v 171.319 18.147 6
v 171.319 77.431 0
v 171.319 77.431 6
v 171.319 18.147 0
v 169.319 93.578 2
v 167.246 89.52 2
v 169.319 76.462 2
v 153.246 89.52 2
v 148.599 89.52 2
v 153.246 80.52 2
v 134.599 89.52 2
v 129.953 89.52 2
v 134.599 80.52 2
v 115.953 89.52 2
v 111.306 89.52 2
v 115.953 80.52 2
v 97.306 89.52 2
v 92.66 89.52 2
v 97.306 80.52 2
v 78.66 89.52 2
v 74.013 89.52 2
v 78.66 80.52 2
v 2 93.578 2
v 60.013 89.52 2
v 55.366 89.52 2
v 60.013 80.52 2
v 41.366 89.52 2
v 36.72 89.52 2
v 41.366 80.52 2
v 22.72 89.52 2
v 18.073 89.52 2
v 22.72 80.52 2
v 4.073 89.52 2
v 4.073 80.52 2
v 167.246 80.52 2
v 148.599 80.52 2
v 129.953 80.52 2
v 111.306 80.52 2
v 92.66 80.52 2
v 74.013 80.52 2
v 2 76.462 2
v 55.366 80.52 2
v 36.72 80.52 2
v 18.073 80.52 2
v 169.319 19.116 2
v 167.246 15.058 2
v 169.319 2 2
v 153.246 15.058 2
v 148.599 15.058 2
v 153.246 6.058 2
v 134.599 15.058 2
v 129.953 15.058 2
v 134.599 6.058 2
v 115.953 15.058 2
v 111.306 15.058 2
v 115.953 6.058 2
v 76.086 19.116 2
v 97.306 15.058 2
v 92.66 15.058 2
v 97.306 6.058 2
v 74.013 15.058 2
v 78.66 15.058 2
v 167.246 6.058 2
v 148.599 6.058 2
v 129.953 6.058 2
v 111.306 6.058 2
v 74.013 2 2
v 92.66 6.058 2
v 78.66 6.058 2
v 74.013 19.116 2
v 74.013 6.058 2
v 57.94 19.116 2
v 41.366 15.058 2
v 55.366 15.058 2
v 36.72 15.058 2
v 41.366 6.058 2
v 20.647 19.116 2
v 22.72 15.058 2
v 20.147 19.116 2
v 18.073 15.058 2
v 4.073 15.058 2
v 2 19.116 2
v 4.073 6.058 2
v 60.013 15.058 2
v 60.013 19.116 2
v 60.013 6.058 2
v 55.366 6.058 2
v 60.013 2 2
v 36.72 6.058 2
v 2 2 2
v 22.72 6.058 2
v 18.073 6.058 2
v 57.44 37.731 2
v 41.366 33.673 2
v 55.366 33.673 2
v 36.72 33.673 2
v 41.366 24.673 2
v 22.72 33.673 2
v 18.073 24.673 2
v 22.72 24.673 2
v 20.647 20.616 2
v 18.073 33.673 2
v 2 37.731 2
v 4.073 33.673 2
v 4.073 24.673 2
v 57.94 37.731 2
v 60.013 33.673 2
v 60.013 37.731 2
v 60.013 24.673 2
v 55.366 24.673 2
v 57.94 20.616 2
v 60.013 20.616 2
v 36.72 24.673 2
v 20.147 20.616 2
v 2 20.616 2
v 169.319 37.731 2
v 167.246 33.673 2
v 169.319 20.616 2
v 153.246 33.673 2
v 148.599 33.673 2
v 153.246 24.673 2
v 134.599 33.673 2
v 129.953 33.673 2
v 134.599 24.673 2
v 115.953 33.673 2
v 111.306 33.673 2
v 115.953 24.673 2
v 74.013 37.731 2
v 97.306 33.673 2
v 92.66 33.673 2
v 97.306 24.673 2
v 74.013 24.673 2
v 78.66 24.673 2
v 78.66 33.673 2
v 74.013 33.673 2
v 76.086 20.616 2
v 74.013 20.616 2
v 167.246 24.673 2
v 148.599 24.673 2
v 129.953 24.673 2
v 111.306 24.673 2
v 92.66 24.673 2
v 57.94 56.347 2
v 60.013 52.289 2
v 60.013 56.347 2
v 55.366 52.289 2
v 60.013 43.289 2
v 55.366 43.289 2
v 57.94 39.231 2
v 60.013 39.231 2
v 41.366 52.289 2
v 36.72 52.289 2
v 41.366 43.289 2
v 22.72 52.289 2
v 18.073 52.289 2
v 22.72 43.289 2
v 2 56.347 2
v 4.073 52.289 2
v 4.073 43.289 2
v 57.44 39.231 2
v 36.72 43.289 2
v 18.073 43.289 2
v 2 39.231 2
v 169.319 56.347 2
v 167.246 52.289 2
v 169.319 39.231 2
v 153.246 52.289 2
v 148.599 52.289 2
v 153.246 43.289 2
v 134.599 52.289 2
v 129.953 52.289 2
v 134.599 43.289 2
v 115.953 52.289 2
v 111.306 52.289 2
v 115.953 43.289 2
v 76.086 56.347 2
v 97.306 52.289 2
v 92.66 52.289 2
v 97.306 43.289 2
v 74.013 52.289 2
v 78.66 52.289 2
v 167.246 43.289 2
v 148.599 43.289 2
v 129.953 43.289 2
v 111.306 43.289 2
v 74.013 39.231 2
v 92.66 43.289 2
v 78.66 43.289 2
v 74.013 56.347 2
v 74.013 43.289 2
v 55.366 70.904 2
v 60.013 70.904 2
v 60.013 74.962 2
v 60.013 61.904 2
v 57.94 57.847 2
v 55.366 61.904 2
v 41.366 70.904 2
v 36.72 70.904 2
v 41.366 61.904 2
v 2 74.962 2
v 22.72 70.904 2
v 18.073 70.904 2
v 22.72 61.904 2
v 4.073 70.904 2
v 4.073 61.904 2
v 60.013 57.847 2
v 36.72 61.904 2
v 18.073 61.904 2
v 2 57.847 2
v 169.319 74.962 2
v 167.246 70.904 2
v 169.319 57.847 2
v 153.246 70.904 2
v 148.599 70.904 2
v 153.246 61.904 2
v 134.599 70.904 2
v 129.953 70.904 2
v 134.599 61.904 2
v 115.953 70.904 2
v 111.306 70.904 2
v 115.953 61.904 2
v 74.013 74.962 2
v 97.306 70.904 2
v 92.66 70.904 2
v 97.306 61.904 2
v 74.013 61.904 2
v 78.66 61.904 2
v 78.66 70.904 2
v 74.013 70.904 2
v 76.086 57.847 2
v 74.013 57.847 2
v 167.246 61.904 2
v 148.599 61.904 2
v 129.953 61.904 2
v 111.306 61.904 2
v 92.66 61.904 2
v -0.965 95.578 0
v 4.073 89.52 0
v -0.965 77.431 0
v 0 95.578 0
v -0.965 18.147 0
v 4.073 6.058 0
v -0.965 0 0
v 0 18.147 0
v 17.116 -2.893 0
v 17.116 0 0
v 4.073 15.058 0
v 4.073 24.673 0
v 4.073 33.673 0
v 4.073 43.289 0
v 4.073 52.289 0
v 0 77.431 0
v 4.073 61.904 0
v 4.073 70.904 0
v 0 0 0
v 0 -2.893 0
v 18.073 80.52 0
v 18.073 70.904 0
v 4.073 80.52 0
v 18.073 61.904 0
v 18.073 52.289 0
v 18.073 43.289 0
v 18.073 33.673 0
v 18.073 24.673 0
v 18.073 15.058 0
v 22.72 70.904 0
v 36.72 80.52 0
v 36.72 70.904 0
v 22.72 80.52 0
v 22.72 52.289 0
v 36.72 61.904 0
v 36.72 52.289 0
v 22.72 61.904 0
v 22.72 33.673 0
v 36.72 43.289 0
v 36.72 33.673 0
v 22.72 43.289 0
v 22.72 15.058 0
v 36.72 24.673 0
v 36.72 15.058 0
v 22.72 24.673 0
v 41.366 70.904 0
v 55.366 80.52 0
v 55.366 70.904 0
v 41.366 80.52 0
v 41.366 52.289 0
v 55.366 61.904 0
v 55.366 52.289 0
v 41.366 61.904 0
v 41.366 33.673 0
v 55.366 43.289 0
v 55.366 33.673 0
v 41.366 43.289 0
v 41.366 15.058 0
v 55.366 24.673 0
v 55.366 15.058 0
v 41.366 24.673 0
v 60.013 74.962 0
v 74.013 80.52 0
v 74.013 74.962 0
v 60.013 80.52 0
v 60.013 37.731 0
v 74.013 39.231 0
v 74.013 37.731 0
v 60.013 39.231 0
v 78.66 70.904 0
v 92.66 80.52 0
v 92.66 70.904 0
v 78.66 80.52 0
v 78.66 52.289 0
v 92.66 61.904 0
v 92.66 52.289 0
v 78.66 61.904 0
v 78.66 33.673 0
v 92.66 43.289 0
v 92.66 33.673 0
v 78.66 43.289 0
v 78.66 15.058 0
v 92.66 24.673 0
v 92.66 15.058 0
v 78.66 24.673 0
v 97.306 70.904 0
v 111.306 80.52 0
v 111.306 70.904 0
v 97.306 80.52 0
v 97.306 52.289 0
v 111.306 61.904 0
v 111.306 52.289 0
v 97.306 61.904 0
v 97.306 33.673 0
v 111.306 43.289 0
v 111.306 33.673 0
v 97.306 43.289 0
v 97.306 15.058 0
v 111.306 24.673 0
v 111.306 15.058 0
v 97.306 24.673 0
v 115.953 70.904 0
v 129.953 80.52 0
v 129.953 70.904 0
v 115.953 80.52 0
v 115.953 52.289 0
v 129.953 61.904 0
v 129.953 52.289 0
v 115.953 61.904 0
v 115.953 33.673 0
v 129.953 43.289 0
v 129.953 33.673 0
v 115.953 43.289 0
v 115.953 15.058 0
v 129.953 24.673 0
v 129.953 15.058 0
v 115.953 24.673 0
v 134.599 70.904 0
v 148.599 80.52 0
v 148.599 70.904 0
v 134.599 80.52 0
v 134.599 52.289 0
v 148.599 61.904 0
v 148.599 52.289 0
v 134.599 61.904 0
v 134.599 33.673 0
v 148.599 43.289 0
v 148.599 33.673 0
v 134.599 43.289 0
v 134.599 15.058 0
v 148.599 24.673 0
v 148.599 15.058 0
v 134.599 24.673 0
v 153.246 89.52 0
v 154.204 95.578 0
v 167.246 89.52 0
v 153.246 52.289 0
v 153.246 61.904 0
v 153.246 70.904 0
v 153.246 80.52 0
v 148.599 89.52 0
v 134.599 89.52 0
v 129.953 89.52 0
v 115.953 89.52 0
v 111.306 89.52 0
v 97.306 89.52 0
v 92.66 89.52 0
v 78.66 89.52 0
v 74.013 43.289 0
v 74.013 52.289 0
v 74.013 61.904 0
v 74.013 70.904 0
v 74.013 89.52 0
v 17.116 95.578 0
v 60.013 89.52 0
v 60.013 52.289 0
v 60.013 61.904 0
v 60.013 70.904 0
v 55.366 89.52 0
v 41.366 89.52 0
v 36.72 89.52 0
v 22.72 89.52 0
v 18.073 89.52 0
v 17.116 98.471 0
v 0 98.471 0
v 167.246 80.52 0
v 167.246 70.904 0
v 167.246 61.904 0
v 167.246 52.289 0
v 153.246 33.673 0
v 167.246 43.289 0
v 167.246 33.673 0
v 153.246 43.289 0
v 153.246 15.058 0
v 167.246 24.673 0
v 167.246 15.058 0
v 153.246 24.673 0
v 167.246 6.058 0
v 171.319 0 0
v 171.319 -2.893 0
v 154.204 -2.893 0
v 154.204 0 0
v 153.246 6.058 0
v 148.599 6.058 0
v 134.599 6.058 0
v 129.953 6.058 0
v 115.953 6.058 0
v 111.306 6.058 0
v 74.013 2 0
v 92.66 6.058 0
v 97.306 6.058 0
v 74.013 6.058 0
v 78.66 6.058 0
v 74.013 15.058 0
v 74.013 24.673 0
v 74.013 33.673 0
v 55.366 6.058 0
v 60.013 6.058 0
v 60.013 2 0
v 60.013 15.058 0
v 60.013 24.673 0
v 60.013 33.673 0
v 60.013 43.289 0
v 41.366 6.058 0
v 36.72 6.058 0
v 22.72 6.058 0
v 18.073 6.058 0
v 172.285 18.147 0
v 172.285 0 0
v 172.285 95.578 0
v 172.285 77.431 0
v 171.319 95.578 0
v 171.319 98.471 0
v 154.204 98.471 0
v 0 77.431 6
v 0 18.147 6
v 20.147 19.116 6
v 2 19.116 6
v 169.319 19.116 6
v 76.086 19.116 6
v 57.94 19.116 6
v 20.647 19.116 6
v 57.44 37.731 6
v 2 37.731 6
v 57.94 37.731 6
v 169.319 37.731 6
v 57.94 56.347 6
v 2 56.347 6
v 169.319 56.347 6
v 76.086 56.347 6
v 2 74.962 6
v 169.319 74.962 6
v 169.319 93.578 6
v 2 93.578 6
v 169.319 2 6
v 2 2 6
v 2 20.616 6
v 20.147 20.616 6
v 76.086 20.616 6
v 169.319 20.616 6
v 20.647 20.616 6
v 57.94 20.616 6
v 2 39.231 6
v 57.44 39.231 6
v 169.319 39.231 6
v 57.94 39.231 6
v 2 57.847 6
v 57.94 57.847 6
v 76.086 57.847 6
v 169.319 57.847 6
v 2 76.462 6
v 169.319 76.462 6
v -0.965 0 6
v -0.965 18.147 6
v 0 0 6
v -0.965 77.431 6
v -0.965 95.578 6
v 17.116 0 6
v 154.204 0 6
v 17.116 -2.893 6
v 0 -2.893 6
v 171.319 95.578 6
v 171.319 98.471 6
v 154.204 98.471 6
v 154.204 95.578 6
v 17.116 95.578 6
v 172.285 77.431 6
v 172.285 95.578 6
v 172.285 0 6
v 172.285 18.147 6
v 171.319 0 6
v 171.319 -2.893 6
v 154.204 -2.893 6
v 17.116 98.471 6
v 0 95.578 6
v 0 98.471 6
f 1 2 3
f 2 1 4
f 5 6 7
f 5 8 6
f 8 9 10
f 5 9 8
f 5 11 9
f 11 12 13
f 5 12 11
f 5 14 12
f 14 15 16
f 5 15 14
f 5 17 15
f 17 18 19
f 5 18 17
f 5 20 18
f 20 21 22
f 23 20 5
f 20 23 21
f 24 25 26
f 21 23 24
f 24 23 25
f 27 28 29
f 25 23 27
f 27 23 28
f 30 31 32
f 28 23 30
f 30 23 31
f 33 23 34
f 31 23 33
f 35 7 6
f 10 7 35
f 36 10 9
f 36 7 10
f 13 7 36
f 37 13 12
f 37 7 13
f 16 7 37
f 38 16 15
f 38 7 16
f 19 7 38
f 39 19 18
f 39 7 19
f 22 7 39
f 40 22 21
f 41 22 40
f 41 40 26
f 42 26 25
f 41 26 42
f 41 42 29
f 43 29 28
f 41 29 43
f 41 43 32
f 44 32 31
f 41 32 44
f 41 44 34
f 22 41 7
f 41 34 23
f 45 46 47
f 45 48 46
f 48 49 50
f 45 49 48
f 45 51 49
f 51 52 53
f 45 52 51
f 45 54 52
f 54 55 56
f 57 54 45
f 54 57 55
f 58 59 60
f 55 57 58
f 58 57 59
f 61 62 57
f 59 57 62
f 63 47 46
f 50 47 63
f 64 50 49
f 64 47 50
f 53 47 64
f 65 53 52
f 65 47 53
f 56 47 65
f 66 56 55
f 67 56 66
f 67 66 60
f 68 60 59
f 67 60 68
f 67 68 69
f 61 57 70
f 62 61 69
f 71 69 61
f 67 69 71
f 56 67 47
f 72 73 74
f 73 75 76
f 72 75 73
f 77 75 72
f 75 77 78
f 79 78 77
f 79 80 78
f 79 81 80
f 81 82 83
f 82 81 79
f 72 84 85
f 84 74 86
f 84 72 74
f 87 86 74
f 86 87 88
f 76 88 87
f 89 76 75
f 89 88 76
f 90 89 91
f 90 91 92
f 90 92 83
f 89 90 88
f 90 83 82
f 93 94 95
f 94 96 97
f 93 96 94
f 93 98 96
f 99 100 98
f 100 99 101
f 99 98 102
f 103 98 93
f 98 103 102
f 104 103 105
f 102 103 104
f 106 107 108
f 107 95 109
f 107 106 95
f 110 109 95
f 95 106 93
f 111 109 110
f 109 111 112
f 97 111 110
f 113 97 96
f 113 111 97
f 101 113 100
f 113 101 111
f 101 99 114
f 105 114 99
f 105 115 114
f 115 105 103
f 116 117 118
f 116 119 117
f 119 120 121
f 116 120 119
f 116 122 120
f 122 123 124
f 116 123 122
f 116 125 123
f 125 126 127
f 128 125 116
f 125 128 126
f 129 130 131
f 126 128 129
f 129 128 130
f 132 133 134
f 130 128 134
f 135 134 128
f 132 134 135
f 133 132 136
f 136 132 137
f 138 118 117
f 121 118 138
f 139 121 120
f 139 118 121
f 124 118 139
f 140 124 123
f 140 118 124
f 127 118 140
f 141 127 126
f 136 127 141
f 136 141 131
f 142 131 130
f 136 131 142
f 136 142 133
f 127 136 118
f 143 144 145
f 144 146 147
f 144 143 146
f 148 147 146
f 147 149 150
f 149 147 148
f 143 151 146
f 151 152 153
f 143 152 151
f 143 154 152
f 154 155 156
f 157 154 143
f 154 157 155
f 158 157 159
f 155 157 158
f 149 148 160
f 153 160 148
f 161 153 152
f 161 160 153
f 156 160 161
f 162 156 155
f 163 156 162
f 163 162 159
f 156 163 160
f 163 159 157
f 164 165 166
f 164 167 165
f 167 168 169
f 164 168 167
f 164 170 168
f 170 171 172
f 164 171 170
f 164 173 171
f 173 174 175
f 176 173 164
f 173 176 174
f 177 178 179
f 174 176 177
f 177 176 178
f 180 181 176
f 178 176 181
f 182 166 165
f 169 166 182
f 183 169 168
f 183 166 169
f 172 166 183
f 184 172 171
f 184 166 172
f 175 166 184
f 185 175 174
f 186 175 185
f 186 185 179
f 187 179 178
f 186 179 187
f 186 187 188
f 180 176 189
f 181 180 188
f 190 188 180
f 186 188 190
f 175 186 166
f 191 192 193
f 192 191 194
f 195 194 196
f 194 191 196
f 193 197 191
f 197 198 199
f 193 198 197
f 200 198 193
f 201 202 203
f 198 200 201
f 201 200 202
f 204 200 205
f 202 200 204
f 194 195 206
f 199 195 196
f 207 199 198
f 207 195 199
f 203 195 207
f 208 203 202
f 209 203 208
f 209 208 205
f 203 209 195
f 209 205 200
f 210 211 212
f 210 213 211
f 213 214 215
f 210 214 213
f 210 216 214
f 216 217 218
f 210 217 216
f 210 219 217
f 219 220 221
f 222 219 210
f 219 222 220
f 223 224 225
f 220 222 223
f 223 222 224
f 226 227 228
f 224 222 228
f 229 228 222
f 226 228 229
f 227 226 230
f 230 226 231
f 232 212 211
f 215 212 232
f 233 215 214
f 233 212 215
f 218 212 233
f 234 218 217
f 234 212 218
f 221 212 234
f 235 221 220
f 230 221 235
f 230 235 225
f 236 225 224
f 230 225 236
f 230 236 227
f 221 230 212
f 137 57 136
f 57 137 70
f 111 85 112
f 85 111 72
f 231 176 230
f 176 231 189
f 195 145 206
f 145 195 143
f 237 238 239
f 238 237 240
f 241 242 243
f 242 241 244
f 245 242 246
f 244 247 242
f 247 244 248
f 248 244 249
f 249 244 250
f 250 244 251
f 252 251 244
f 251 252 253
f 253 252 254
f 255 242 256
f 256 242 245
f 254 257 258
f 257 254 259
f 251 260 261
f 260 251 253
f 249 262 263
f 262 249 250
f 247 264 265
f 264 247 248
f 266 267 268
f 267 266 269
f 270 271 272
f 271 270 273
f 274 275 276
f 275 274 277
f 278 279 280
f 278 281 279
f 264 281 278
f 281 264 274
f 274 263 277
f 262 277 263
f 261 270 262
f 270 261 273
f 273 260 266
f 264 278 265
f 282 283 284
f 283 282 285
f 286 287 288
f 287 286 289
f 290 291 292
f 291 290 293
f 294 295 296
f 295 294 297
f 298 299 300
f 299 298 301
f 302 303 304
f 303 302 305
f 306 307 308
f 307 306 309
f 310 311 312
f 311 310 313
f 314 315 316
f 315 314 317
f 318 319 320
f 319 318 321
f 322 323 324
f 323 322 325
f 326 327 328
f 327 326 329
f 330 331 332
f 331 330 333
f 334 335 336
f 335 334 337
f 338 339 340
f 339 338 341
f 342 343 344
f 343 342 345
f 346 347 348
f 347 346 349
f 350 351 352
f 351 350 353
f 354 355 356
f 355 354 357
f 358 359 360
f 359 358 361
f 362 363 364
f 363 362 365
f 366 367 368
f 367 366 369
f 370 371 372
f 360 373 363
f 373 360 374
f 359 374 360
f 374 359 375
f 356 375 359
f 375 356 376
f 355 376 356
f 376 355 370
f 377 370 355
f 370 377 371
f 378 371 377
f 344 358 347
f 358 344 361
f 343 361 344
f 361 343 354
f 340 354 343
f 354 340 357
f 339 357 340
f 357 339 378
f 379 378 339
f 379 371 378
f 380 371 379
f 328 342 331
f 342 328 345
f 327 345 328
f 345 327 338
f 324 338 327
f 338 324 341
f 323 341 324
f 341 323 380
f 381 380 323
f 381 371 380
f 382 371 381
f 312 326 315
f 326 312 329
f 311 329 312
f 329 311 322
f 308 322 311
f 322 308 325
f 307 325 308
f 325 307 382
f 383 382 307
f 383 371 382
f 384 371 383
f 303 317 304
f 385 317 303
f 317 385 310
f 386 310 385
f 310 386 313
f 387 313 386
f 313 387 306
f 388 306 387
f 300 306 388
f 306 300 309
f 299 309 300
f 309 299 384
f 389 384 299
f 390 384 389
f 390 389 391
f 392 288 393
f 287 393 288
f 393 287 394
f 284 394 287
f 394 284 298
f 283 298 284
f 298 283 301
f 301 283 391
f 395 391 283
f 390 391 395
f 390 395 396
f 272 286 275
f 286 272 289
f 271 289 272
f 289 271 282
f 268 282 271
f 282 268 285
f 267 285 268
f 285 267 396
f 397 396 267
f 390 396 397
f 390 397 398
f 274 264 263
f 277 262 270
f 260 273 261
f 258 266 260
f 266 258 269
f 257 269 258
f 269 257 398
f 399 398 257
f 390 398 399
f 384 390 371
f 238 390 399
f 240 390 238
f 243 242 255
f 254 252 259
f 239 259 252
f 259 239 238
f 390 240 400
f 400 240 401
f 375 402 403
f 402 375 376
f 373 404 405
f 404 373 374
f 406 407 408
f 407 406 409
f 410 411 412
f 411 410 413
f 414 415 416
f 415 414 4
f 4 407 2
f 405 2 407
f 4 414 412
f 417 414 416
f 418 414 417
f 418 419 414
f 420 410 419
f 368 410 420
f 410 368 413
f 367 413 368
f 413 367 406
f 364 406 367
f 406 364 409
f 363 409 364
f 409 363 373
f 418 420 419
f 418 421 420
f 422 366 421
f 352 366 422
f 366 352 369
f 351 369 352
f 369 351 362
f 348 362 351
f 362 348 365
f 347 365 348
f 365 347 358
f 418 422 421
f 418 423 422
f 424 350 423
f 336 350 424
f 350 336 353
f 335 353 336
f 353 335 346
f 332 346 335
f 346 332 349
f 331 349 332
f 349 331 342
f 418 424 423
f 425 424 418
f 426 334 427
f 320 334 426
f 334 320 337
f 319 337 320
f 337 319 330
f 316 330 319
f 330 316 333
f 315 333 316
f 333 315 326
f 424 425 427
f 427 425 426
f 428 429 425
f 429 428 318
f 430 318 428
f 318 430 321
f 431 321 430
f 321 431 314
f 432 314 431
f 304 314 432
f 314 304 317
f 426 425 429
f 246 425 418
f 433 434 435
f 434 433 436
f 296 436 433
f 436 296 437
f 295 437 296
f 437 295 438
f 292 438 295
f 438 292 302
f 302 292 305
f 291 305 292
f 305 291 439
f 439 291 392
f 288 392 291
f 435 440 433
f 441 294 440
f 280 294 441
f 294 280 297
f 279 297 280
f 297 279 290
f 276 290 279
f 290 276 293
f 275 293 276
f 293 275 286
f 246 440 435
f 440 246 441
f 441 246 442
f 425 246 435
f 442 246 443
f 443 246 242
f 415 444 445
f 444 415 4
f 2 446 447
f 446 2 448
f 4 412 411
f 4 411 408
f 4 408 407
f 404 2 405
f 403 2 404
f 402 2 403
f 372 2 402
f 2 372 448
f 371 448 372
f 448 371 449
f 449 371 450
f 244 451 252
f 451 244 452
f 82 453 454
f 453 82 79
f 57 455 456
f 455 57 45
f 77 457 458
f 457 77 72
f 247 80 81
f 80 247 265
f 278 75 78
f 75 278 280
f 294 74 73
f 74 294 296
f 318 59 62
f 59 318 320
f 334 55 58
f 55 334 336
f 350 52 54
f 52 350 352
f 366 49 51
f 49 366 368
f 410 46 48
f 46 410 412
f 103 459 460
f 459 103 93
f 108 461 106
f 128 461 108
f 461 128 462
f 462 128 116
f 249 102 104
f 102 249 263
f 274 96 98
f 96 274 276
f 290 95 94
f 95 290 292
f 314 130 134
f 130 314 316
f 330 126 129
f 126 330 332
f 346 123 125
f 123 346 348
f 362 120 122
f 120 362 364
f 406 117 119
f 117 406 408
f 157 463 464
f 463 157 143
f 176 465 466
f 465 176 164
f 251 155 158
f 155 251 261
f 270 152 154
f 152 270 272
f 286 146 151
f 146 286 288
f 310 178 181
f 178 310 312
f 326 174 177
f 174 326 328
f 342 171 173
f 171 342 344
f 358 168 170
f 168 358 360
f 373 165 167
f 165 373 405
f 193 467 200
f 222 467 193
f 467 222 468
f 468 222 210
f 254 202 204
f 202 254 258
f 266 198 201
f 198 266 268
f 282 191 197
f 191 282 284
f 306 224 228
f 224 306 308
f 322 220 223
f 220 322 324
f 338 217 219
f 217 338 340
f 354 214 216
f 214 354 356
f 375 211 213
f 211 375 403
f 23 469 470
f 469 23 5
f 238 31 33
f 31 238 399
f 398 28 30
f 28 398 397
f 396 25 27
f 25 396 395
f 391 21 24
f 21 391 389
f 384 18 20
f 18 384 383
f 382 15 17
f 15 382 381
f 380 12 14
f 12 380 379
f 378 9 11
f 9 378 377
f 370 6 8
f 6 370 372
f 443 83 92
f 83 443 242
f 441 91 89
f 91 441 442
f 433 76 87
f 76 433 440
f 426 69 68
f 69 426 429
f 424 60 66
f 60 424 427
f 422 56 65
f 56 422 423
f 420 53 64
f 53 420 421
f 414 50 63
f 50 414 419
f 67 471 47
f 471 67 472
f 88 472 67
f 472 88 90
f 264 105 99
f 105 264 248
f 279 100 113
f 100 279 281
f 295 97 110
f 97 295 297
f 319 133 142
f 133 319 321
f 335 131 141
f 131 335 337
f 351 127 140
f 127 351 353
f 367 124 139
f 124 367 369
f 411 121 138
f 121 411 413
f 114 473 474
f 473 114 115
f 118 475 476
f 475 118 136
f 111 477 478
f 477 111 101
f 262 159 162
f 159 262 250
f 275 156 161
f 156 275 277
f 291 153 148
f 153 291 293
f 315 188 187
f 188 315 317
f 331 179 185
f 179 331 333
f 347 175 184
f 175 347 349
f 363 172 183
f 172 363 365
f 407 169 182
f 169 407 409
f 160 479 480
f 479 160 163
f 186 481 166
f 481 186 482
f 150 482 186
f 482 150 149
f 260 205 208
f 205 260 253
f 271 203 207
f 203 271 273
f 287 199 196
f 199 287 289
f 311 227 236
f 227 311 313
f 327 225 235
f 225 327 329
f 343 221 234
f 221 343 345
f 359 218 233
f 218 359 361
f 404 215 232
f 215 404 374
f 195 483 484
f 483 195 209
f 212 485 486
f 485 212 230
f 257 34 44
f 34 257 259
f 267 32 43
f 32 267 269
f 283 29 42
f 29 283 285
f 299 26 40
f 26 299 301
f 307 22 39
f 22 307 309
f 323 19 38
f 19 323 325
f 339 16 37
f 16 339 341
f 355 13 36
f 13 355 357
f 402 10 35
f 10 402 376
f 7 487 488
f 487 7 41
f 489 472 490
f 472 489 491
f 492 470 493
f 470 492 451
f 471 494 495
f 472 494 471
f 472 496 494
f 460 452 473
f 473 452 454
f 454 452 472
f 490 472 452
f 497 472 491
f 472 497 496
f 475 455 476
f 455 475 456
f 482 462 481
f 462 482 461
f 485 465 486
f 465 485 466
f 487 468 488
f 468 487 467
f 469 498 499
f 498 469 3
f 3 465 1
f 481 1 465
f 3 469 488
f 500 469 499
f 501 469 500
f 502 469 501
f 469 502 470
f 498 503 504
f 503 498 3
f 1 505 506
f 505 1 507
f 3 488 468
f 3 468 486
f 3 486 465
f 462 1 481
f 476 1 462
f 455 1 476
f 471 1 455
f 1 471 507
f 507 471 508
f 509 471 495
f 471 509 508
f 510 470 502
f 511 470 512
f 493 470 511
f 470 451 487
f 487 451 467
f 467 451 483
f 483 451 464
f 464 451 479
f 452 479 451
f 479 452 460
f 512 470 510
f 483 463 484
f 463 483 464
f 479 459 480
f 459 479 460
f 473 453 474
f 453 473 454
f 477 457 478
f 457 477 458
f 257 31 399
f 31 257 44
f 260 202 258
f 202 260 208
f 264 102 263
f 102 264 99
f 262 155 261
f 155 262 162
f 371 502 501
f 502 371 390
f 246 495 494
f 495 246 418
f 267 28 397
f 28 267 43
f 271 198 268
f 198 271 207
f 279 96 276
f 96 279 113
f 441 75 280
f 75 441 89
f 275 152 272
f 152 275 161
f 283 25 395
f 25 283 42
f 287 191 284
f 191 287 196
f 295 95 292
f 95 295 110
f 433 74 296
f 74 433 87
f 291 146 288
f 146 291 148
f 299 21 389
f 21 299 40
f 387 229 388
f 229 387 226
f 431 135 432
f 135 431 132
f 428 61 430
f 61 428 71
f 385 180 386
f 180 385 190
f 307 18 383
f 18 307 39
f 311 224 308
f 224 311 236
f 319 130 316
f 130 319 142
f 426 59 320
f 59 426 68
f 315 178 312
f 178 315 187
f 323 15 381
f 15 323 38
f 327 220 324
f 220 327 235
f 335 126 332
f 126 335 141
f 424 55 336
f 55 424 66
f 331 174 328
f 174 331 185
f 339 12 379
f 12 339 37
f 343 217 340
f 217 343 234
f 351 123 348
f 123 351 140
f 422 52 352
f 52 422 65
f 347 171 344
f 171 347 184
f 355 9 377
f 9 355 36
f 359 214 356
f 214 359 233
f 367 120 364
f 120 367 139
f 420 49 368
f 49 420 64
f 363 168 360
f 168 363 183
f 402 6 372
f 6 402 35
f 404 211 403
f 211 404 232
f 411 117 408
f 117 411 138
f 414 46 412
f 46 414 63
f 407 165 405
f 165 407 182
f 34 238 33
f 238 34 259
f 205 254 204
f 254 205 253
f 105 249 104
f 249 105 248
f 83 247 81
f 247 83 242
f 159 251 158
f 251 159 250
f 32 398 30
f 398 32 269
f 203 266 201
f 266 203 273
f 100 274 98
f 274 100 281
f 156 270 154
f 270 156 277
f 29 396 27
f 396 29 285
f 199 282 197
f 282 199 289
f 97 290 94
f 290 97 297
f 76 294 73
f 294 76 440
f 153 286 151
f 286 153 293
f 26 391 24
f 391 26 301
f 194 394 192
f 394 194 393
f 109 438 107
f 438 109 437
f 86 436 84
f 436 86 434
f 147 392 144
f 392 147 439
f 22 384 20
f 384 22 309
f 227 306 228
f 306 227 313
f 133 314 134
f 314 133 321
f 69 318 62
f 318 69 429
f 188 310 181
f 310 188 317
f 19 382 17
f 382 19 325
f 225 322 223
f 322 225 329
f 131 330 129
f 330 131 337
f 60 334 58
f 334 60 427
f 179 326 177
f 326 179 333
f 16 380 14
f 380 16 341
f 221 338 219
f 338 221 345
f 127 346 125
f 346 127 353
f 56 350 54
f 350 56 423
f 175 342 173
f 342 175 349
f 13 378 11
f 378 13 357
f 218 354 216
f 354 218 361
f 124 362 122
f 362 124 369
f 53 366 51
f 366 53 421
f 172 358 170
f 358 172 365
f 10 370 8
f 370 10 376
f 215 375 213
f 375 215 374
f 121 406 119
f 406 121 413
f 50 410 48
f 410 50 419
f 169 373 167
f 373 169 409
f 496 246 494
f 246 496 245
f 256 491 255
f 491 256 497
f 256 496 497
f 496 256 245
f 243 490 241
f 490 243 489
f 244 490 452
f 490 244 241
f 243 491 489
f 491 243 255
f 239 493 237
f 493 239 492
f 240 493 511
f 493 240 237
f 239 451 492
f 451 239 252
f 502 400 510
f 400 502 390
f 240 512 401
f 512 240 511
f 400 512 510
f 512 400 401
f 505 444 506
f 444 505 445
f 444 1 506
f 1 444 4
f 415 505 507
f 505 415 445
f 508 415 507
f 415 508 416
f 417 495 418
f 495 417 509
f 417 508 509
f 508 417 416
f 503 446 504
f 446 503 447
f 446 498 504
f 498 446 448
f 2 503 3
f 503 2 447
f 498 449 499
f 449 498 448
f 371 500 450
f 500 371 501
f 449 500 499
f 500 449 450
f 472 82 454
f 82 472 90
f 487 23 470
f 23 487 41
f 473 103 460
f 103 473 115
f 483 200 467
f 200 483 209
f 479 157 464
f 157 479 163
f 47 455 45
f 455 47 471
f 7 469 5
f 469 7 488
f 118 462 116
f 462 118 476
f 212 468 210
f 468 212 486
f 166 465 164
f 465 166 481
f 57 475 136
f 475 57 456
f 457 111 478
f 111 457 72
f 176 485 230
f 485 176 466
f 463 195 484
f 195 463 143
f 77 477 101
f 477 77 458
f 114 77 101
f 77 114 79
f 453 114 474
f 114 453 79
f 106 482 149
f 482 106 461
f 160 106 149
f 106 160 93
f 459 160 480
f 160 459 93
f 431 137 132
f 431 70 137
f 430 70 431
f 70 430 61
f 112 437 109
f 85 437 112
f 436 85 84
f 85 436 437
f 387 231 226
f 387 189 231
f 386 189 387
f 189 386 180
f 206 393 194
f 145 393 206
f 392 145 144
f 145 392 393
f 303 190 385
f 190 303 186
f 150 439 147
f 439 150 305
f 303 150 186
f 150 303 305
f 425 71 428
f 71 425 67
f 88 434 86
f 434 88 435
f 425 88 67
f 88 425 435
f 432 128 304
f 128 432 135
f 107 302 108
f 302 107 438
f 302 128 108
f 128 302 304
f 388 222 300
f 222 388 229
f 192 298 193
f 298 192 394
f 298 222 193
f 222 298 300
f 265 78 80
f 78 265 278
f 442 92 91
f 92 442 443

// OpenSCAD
// 鍵帽儲存托盤產生器
// Keycap Storage Tray Generator
include <KSTG_Base.SCAD>

// 可複製此樣板檔依照自己需求另存新檔
// 以便以檔案區隔樣式

// 存放盒子的大小:
//BoxSize_L1 = 190; //長度(水平)
//BoxSize_W1 = 120; //寬度(垂直)
//BoxSize_H1 = 55;  //高度


//A4紙的尺寸是210mm×297mm
//BoxSize_L1 = 297/2; //長度(水平)
//BoxSize_L1 = 297/15*7-5; //長度(水平)
//BoxSize_L1 = 297/15*8; //長度(水平)

//BoxSize_W1 = 210/2; //寬度(垂直)
//BoxSize_W1 = 210/11*5+1; //寬度(垂直)
//BoxSize_W1 = 210/11*6+1; //寬度(垂直)

//BoxSize_L1 = 308/16*9+0; //長度(水平)
//BoxSize_W1 = 223/11*5+0; //寬度(垂直)

BoxSize_L1 = 308/16*9+0; //長度(水平)
BoxSize_W1 = 223/11*5+0; //寬度(垂直)

BoxSize_H1 = 55;  //高度


// 外圍
Tray_Fence_T = 2;  //厚度
Tray_Fence_H = 4;  //高度

sc= 16.6/16.1;
//放置鍵帽空間
Keycaps_Space_L = 17.6*sc;
Keycaps_Space_W = 16.6*sc;

// 分隔片
//Tray_Separator_T = 0.8;  //厚度
Tray_Separator_H = 4;  //高度 建議高於上一層與此層鍵帽間的空隙,避免運輸時鍵帽脫落跑到其他空間
Tray_Separator_L = 3;  //短隔板長度
Tray_Separator_T_L = 1.5;  //厚度 (長;水平) 
Tray_Separator_T_W = 0.5;  //厚度 (寬;垂直)

// 分隔片(長寬區分/尚未使用)
//Tray_Separator_H_L = 5;  //長(水平) 高度
//Tray_Separator_H_W = 5;  //寬(垂直) 高度

// 底板 分隔板往中心延伸的底板
Tray_Bottom_L = (Keycaps_Space_W-9)/2; //水平底板寬度
Tray_Bottom_W = (Keycaps_Space_L-14)/2; //垂直底板寬度
Tray_Bottom_T = 2; //底板厚度

//常見鍵帽高度表:
//SA  16.5mm  Cherry 9.4mm
//OEM 11.9mm  TAI HAO 14.8
//XDA 9.1mm   DSA 7.6
//ADA 8mm (18.2x18.2mm )
//適用於 Tray_Column_H 參數

//四角落立柱高度
//堆疊托盤時可墊高避免直接碰觸鍵帽
Tray_Column_H = 4; // 高度 可依照鍵帽高度調整
Tray_Column_T = 2;  // 厚度
Tray_Column_L = 30; // 長面長度
Tray_Column_W = 30; // 寬面長度 

//垂直分隔片樣式
// 0 不需要
// 1 全部
// 2 短隔板無垂直底板
// 3 短隔板有垂直底板
// 4 無隔板有垂直底板

Tray_VS_Type = 4;

//多餘空間處理方式
//How to use the extra space
// 0 不處理，照原本盒子大小產生外圍
// 1 不處理，僅列印鍵帽所需空間
// 2 角落填補剩餘空間
ExtraSpaceUse = 2;

//填補空間高度
ES_H = Tray_Column_H + Tray_Column_T; 
//ES_H = Tray_Separator_H + Tray_Separator_T;

//是否顯示文字標記 0關/1開
ShowText = 1 ;

//請參考F5後帶出的座標數值
//例如：
// Tray_Separator_Cut_L=[
// [1,1],[2,1],[3,1],[1,2]
// ];

//清除分隔片與底板

// 長(水平)分隔片 紅色
Tray_Separator_Cut_L=[
[4,1],[4,3]
];
// 寬(垂直)分隔片 藍色,     
Tray_Separator_Cut_W=[
];
// 交錯點 綠色 長寬分隔片交會處
// 須手動清除交錯點
Tray_Separator_Cut_C=[
[1,1],[3,2]
];
// 長(水平)底板 紅色
Tray_Separator_Cut_LB=[
[4,1],[4,3]
];
// 寬(垂直)底板 藍色
Tray_Separator_Cut_WB=[
[1,1]
];

// 長(水平)底板 僅上方 紅色
Tray_Separator_Cut_LBU=[
[4,2],[4,0]
];

// 長(水平)底板 僅下方 紅色
Tray_Separator_Cut_LBD=[
[4,2],[4,4]
];

//增加分隔片與底板

// 長(水平)分隔片 紅色
Tray_Separator_Put_L=[
];
// 寬(垂直)分隔片 藍色     
Tray_Separator_Put_W=[
];
// 交錯點 綠色 長寬分隔片交會處
Tray_Separator_Put_C=[
];
// 長(水平)底板 紅色
Tray_Separator_Put_LB=[
//[4,1],[4,3]
];
// 寬(垂直)底板 藍色
Tray_Separator_Put_WB=[
];

CreateKST();
